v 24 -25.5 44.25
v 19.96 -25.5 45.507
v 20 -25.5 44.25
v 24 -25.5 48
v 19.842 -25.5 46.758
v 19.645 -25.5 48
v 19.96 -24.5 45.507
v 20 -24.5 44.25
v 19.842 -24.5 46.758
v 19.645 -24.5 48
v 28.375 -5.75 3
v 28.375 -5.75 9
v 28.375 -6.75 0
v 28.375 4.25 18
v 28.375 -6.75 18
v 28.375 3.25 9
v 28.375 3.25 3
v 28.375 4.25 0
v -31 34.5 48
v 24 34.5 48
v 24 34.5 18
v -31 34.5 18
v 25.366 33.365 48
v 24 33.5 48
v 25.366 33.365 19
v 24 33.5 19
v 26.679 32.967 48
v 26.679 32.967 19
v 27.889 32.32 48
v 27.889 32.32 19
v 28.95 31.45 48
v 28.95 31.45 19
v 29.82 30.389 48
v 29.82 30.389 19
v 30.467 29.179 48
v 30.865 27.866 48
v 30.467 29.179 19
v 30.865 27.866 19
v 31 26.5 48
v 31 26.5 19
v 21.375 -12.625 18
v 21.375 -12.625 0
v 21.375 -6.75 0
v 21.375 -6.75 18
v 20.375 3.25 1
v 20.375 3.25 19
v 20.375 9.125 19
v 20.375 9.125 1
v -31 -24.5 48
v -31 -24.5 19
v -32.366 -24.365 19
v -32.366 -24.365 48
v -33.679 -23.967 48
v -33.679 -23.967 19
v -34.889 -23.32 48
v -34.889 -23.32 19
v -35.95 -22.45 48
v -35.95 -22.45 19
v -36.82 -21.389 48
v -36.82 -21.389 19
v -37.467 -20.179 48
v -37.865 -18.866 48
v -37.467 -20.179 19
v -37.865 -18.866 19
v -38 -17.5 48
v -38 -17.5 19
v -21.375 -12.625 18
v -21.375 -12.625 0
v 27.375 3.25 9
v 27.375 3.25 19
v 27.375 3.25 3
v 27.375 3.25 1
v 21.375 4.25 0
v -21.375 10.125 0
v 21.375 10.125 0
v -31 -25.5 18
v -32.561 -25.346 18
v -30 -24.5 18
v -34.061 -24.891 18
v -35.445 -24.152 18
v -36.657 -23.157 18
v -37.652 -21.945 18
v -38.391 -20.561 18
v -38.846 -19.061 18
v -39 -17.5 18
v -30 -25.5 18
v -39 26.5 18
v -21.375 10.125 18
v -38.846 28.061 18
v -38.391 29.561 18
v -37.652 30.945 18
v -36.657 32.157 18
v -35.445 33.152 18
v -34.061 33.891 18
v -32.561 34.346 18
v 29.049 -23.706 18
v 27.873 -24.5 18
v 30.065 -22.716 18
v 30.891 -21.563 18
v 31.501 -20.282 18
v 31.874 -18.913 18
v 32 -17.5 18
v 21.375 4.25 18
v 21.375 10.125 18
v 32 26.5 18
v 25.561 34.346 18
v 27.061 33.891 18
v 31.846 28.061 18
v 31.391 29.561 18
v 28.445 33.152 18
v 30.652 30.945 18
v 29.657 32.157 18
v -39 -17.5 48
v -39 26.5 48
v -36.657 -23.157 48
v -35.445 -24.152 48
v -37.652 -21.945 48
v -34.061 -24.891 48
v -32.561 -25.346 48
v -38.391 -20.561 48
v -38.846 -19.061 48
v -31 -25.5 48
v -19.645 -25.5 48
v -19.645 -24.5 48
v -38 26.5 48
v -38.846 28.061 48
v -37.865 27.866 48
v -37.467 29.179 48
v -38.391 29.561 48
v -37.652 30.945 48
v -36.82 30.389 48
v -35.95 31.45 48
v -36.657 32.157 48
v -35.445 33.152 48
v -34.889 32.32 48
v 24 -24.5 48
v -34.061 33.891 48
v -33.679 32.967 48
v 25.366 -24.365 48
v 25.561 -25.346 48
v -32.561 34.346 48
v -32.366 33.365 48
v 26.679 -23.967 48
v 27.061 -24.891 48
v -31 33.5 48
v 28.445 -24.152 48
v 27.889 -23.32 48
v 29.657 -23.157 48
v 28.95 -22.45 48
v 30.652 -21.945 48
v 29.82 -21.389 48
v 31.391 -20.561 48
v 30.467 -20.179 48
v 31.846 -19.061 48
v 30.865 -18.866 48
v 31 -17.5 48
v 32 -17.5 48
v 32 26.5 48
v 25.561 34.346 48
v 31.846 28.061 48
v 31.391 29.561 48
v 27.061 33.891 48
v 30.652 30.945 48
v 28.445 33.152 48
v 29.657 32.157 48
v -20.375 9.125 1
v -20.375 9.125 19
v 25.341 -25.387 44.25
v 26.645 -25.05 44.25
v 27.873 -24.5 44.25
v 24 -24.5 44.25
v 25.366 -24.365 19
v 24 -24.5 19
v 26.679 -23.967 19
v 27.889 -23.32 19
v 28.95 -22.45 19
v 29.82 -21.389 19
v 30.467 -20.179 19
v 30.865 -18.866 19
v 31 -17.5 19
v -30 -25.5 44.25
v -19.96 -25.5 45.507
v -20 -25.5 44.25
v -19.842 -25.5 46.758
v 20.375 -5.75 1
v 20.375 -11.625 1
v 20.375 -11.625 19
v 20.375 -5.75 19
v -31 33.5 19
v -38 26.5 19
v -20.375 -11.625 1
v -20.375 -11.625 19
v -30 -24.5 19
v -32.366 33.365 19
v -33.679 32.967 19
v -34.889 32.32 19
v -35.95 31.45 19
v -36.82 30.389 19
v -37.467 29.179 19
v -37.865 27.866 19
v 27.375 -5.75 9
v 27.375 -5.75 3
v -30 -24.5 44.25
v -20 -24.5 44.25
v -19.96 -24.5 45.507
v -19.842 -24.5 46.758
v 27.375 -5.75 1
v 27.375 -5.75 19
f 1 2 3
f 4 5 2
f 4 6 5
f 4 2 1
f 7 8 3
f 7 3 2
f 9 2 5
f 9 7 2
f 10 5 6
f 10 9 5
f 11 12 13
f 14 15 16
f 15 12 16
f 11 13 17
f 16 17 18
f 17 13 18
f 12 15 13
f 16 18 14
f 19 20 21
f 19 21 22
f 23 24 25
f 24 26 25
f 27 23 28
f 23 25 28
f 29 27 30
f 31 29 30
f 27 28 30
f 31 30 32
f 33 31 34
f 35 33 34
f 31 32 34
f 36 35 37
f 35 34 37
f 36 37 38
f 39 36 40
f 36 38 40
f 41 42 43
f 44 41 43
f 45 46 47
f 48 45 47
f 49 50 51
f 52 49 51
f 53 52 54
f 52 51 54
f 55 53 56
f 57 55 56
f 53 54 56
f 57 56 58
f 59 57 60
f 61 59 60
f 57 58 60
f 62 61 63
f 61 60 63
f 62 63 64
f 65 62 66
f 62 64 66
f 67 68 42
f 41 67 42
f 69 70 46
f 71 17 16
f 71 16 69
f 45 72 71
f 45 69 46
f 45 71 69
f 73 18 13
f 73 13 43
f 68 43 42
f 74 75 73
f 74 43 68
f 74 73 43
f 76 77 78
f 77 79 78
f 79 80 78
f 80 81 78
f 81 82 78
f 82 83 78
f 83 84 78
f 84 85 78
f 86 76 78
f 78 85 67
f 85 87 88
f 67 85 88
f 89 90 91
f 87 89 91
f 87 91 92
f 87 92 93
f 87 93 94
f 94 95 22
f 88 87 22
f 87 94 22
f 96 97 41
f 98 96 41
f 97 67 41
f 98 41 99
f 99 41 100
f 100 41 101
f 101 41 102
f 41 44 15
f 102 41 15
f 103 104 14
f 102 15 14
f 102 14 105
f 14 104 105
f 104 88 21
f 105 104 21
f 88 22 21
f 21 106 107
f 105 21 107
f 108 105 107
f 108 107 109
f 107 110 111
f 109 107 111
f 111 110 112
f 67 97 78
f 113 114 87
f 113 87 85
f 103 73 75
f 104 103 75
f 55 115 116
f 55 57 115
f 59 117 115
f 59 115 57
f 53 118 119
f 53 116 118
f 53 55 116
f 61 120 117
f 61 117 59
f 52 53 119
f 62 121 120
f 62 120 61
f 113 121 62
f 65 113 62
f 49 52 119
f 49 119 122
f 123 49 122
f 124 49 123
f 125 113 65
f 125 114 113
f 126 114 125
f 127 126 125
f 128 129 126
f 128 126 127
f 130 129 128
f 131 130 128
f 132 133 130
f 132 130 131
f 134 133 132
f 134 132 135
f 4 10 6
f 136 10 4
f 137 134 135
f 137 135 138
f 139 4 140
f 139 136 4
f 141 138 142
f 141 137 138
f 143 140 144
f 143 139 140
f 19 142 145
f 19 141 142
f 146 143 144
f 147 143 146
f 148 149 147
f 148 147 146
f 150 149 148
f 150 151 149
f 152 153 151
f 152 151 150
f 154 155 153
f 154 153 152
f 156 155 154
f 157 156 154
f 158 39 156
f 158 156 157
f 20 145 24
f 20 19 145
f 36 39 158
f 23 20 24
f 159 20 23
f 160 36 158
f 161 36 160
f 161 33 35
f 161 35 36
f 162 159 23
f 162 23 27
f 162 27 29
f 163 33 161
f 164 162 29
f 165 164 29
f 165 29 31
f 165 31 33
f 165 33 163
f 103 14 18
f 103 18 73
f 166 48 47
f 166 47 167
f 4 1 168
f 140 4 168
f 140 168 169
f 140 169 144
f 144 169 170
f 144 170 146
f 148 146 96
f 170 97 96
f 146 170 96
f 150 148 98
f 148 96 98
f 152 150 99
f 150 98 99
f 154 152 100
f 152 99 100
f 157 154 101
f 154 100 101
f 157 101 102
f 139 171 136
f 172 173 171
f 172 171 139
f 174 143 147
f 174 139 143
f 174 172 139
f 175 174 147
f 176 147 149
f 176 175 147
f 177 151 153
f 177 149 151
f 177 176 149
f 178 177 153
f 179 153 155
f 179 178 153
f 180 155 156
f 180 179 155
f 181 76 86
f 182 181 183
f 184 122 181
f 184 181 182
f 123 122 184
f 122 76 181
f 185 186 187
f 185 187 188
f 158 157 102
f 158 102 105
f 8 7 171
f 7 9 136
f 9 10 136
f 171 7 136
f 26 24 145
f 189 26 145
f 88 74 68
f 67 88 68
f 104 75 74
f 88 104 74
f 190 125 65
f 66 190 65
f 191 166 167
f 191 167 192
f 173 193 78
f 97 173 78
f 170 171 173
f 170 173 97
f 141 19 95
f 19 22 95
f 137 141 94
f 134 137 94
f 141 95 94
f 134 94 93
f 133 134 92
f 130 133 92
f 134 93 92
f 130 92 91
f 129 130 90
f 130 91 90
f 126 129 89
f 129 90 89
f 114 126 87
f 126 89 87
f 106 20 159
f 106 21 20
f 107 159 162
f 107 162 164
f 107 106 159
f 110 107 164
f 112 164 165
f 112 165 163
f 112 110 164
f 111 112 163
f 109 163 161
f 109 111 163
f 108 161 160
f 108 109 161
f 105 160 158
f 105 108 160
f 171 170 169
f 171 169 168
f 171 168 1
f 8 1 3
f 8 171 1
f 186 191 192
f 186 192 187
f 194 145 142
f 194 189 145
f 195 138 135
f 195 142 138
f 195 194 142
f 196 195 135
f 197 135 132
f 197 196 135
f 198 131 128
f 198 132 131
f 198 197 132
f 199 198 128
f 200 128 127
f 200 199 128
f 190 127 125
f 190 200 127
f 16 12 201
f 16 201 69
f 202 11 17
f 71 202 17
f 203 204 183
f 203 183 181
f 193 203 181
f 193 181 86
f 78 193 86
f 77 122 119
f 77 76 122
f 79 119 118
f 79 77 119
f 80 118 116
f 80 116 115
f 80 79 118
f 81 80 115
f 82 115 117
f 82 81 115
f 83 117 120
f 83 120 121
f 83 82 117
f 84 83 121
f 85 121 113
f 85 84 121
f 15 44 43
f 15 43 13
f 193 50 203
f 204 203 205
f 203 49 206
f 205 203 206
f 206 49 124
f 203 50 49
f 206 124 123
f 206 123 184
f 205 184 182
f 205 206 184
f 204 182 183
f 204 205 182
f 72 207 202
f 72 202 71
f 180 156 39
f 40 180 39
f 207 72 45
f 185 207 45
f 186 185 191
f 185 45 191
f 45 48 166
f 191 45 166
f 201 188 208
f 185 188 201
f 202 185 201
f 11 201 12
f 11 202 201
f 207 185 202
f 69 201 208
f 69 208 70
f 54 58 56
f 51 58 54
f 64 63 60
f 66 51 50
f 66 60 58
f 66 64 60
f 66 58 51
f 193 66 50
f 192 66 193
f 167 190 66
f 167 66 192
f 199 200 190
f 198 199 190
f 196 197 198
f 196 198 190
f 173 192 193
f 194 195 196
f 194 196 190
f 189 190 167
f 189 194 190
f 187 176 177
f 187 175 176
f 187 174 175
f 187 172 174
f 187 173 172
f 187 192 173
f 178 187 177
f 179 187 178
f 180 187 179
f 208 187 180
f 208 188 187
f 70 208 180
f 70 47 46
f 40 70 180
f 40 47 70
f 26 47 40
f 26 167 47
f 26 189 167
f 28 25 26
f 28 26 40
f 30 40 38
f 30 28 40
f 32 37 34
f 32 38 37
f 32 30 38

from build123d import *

# Parameters (mm, degrees)
SKETCH1_W               = 60
SKETCH1_H               = 51
BOSS_EXTRUDE3_DEPTH     = 48
CUT_EXTRUDE1_DEPTH      = 18
CUT_EXTRUDE2_DEPTH      = 77.190550595
CUT_EXTRUDE2_DEPTH_BACK = 11.25
SKETCH2_W               = 40
SKETCH2_H               = 18
BOSS_EXTRUDE4_DEPTH     = 30
FILLET1_R               = 8
SHELL1_T                = -1
CUT_EXTRUDE5_START      = -1
CUT_EXTRUDE5_DEPTH      = 1
SKETCH5_W               = 6
SKETCH5_H               = 9
CUT_EXTRUDE4_DEPTH      = 1


# Read off the part's stored shape, not the designer's step: Cut-Extrude5
with BuildPart() as part:
    # Sketch1 → Boss-Extrude3 (new body)
    with BuildSketch(Plane(origin=(0, 0, 0), x_dir=(-1, 0, 0), z_dir=(0, 0, -1))):
        Rectangle(SKETCH1_W, SKETCH1_H)
    extrude(amount=-BOSS_EXTRUDE3_DEPTH)

    # Sketch1<6> → Cut-Extrude1 (cut)
    with BuildSketch(Plane(origin=(0, 0, 0), x_dir=(-1, 0, 0), z_dir=(0, 0, -1))):
        Polygon((-20, -25.5), (-20, -14.25), (20, -14.25), (20, -25.5), (30, -25.5), (30, 25.5), (-30, 25.5), (-30, -25.5), align=None)
        Polygon((21.375, -12.625), (-21.375, -12.625), (-21.375, -6.75), (-28.375, -6.75), (-28.375, 4.25), (-21.375, 4.25), (-21.375, 10.125), (21.375, 10.125), align=None, mode=Mode.SUBTRACT)
    extrude(amount=-CUT_EXTRUDE1_DEPTH, mode=Mode.SUBTRACT)

    # Sketch2 → Cut-Extrude2 (cut, two sides: drawn at the far end of the back side and taken through both)
    with BuildSketch(Plane.XZ.offset(25.5).offset(-CUT_EXTRUDE2_DEPTH_BACK)):
        with Locations((0, 9)):
            Rectangle(SKETCH2_W, SKETCH2_H)
    extrude(amount=CUT_EXTRUDE2_DEPTH + CUT_EXTRUDE2_DEPTH_BACK, mode=Mode.SUBTRACT)

    # Sketch6 → Boss-Extrude4 (add)
    with BuildSketch(Plane.XY.offset(48)):
        Polygon((30, 25.5), (30, -25.5), (32, -25.5), (32, 34.5), (-39, 34.5), (-39, -25.5), (-30, -25.5), (-30, 25.5), align=None)
    extrude(amount=-BOSS_EXTRUDE4_DEPTH)

    # Fillet1
    fillet1_edges = [part.edges().sort_by_distance(p)[0] for p in [
        (-39, 34.5, 33),
        (32, 34.5, 33),
        (32, -25.5, 33),
        (-39, -25.5, 33),
    ]]
    fillet(fillet1_edges, radius=FILLET1_R)

    # Shell1
    shell1_openings = [part.faces().sort_by_distance(p)[0] for p in [
        (-3.5, 4.5, 48),
    ]]
    offset(amount=SHELL1_T, openings=shell1_openings, kind=Kind.INTERSECTION)

    # Cut-Extrude5 outline → Cut-Extrude5 (cut)
    with BuildSketch(Plane.XZ.offset(25.5).offset(CUT_EXTRUDE5_START)):
        with BuildLine():
            Line((29, 44.25), (20, 44.25))
            ThreePointArc((20, 44.25), (19.911125548, 46.13336917), (19.645292057, 48))
            Line((19.645292057, 48), (-19.645292057, 48))
            ThreePointArc((-19.645292057, 48), (-19.911125548, 46.13336917), (-20, 44.25))
            Line((-20, 44.25), (-30, 44.25))
            Line((-30, 44.25), (-30, 17))
            Line((-30, 17), (29, 17))
            Line((29, 17), (29, 44.25))
        make_face()
    extrude(amount=CUT_EXTRUDE5_DEPTH, mode=Mode.SUBTRACT)

    # Sketch5 → Cut-Extrude4 (cut)
    with BuildSketch(Plane(origin=(28.375, 0, 0), x_dir=(0, 0, -1), z_dir=(1, 0, 0))):
        with Locations((-6, -1.25)):
            Rectangle(SKETCH5_W, SKETCH5_H)
    extrude(amount=-CUT_EXTRUDE4_DEPTH, mode=Mode.SUBTRACT)


solid = part.part
